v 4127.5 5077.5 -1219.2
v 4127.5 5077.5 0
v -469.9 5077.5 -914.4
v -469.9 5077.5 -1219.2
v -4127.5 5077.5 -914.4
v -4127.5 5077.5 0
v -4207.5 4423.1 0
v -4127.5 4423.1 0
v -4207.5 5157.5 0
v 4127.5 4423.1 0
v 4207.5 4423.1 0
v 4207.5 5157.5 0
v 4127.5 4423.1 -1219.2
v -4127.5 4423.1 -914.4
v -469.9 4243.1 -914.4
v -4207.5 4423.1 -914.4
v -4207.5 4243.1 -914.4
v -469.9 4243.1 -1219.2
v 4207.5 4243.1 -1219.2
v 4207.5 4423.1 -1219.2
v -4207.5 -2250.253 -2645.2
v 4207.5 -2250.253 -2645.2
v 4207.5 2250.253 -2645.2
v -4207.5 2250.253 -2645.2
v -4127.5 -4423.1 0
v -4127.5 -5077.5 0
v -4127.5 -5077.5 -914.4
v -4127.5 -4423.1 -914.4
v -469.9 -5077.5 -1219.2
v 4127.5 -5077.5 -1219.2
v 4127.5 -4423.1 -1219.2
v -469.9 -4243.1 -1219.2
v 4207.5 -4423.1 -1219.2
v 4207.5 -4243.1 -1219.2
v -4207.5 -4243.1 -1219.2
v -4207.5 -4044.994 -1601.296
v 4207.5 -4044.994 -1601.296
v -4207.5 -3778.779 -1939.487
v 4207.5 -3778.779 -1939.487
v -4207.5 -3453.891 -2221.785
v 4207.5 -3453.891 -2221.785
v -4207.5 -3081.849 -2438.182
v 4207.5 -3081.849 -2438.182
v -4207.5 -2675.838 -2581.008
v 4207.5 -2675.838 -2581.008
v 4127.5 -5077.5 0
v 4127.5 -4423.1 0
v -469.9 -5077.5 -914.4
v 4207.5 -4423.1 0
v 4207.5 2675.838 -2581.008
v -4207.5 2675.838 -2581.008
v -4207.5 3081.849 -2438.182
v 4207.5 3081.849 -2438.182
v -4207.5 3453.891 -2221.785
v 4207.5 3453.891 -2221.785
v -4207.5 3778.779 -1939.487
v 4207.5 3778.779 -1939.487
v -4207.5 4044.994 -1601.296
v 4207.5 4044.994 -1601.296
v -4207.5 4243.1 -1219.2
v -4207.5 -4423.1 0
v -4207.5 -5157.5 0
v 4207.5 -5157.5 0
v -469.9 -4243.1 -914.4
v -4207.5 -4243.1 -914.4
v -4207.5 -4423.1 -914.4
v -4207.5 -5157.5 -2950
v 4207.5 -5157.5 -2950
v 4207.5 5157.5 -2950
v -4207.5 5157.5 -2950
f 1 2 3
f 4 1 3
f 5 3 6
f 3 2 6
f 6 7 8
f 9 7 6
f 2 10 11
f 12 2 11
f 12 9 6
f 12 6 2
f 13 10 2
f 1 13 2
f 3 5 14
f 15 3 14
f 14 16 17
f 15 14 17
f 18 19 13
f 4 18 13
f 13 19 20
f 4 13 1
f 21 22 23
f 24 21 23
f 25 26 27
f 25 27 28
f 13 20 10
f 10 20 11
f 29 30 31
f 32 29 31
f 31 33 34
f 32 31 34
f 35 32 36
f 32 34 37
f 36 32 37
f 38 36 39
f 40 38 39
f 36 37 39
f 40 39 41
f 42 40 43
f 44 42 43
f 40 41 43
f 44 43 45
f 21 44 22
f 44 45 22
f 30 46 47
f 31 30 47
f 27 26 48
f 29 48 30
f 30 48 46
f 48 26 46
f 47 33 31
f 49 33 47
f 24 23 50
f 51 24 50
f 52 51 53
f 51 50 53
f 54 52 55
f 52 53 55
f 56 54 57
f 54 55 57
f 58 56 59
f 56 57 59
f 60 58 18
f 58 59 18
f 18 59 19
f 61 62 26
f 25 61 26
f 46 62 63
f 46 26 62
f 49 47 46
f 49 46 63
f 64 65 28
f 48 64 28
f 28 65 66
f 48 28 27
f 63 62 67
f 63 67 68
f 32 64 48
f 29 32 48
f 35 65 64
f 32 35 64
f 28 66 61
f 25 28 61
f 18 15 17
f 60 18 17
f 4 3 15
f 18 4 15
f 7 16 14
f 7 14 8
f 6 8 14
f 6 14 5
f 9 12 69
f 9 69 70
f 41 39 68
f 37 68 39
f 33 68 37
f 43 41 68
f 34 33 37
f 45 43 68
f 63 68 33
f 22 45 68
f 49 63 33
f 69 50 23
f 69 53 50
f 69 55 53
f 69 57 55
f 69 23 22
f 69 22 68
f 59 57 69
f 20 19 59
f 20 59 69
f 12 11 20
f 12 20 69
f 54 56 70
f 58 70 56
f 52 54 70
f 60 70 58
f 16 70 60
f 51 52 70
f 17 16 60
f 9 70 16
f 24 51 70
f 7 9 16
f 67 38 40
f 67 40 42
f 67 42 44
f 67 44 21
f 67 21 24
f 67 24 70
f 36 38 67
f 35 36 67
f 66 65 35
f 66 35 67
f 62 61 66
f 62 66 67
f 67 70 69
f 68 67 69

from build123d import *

# Parameters (mm, degrees)
F0_W     = 3657.6
F0_H     = 8486.2
F0_W_2   = 80
F0_H_2   = 834.4
F1_DEPTH = 2950
F2_DEPTH = 1219.2
F3_DEPTH = 914.4
F5_DEPTH = 8415.001
F4_W     = 180
F4_H     = 1219.2
F6_DEPTH = 80
F7_W     = 180
F7_H     = 914.4
F8_DEPTH = 80


with BuildPart() as f1:
    # F0 (on Top) → F1 (new body)
    with BuildSketch(Plane.XY):
        with Locations((-2298.7, 0)):
            Rectangle(F0_W, F0_H)
        with Locations((-4167.5, 0)):
            Rectangle(F0_W_2, F0_H)
        Polygon((4127.5, -4243.1), (4127.5, 4243.1), (4127.5, 5077.5), (-469.9, 5077.5), (-469.9, 4243.1), (-469.9, -4243.1), (-469.9, -5077.5), (4127.5, -5077.5), align=None)
        with Locations((4167.5, 0)):
            Rectangle(F0_W_2, F0_H)
        with Locations((-2298.7, 4660.3)):
            Rectangle(F0_W, F0_H_2)
        Polygon((4207.5, 4243.1), (4207.5, 5157.5), (-4207.5, 5157.5), (-4207.5, 4243.1), (-4127.5, 4243.1), (-4127.5, 5077.5), (-469.9, 5077.5), (4127.5, 5077.5), (4127.5, 4243.1), align=None)
        with Locations((-2298.7, -4660.3)):
            Rectangle(F0_W, F0_H_2)
        Polygon((4207.5, -5157.5), (4207.5, -4243.1), (4127.5, -4243.1), (4127.5, -5077.5), (-469.9, -5077.5), (-4127.5, -5077.5), (-4127.5, -4243.1), (-4207.5, -4243.1), (-4207.5, -5157.5), align=None)
    extrude(amount=-F1_DEPTH)

    # F0 (on Top) → F2 (cut)
    with BuildSketch(Plane.XY):
        with Locations((-4167.5, 0)):
            Rectangle(F0_W_2, F0_H)
        with Locations((-2298.7, 0)):
            Rectangle(F0_W, F0_H)
        Polygon((4127.5, -4243.1), (4127.5, 4243.1), (4127.5, 5077.5), (-469.9, 5077.5), (-469.9, 4243.1), (-469.9, -4243.1), (-469.9, -5077.5), (4127.5, -5077.5), align=None)
        with Locations((4167.5, 0)):
            Rectangle(F0_W_2, F0_H)
    extrude(amount=-F2_DEPTH, mode=Mode.SUBTRACT)

    # F0 (on Top) → F3 (cut)
    with BuildSketch(Plane.XY):
        with Locations((-2298.7, -4660.3)):
            Rectangle(F0_W, F0_H_2)
        with Locations((-2298.7, 4660.3)):
            Rectangle(F0_W, F0_H_2)
    extrude(amount=-F3_DEPTH, mode=Mode.SUBTRACT)

    # F4 (on face) → F5 (cut, through all)
    with BuildSketch(Plane.YZ.offset(4207.5)):
        with BuildLine():
            Line((4243.1, -1219.2), (-4243.1, -1219.2))
            ThreePointArc((-4243.1, -1219.2), (-3453.891453, -2221.784794), (-2250.252819, -2645.2))
            Line((-2250.252819, -2645.2), (2250.252819, -2645.2))
            ThreePointArc((2250.252819, -2645.2), (3453.891453, -2221.784794), (4243.1, -1219.2))
        make_face()
    extrude(amount=-F5_DEPTH, mode=Mode.SUBTRACT)

    # F4 (on face) → F6 (cut, through all)
    with BuildSketch(Plane.YZ.offset(4207.5)):
        with Locations((-4333.1, -609.6)):
            Rectangle(F4_W, F4_H)
        with Locations((4333.1, -609.6)):
            Rectangle(F4_W, F4_H)
    extrude(amount=-F6_DEPTH, mode=Mode.SUBTRACT)

    # F7 (on face) → F8 (cut, through all)
    with BuildSketch(Plane(origin=(-4207.5, 0, 0), x_dir=(0, -1, 0), z_dir=(-1, 0, 0))):
        with Locations((-4333.1, -457.2)):
            Rectangle(F7_W, F7_H)
        with Locations((4333.1, -457.2)):
            Rectangle(F7_W, F7_H)
    extrude(amount=-F8_DEPTH, mode=Mode.SUBTRACT)


solid = f1.part
